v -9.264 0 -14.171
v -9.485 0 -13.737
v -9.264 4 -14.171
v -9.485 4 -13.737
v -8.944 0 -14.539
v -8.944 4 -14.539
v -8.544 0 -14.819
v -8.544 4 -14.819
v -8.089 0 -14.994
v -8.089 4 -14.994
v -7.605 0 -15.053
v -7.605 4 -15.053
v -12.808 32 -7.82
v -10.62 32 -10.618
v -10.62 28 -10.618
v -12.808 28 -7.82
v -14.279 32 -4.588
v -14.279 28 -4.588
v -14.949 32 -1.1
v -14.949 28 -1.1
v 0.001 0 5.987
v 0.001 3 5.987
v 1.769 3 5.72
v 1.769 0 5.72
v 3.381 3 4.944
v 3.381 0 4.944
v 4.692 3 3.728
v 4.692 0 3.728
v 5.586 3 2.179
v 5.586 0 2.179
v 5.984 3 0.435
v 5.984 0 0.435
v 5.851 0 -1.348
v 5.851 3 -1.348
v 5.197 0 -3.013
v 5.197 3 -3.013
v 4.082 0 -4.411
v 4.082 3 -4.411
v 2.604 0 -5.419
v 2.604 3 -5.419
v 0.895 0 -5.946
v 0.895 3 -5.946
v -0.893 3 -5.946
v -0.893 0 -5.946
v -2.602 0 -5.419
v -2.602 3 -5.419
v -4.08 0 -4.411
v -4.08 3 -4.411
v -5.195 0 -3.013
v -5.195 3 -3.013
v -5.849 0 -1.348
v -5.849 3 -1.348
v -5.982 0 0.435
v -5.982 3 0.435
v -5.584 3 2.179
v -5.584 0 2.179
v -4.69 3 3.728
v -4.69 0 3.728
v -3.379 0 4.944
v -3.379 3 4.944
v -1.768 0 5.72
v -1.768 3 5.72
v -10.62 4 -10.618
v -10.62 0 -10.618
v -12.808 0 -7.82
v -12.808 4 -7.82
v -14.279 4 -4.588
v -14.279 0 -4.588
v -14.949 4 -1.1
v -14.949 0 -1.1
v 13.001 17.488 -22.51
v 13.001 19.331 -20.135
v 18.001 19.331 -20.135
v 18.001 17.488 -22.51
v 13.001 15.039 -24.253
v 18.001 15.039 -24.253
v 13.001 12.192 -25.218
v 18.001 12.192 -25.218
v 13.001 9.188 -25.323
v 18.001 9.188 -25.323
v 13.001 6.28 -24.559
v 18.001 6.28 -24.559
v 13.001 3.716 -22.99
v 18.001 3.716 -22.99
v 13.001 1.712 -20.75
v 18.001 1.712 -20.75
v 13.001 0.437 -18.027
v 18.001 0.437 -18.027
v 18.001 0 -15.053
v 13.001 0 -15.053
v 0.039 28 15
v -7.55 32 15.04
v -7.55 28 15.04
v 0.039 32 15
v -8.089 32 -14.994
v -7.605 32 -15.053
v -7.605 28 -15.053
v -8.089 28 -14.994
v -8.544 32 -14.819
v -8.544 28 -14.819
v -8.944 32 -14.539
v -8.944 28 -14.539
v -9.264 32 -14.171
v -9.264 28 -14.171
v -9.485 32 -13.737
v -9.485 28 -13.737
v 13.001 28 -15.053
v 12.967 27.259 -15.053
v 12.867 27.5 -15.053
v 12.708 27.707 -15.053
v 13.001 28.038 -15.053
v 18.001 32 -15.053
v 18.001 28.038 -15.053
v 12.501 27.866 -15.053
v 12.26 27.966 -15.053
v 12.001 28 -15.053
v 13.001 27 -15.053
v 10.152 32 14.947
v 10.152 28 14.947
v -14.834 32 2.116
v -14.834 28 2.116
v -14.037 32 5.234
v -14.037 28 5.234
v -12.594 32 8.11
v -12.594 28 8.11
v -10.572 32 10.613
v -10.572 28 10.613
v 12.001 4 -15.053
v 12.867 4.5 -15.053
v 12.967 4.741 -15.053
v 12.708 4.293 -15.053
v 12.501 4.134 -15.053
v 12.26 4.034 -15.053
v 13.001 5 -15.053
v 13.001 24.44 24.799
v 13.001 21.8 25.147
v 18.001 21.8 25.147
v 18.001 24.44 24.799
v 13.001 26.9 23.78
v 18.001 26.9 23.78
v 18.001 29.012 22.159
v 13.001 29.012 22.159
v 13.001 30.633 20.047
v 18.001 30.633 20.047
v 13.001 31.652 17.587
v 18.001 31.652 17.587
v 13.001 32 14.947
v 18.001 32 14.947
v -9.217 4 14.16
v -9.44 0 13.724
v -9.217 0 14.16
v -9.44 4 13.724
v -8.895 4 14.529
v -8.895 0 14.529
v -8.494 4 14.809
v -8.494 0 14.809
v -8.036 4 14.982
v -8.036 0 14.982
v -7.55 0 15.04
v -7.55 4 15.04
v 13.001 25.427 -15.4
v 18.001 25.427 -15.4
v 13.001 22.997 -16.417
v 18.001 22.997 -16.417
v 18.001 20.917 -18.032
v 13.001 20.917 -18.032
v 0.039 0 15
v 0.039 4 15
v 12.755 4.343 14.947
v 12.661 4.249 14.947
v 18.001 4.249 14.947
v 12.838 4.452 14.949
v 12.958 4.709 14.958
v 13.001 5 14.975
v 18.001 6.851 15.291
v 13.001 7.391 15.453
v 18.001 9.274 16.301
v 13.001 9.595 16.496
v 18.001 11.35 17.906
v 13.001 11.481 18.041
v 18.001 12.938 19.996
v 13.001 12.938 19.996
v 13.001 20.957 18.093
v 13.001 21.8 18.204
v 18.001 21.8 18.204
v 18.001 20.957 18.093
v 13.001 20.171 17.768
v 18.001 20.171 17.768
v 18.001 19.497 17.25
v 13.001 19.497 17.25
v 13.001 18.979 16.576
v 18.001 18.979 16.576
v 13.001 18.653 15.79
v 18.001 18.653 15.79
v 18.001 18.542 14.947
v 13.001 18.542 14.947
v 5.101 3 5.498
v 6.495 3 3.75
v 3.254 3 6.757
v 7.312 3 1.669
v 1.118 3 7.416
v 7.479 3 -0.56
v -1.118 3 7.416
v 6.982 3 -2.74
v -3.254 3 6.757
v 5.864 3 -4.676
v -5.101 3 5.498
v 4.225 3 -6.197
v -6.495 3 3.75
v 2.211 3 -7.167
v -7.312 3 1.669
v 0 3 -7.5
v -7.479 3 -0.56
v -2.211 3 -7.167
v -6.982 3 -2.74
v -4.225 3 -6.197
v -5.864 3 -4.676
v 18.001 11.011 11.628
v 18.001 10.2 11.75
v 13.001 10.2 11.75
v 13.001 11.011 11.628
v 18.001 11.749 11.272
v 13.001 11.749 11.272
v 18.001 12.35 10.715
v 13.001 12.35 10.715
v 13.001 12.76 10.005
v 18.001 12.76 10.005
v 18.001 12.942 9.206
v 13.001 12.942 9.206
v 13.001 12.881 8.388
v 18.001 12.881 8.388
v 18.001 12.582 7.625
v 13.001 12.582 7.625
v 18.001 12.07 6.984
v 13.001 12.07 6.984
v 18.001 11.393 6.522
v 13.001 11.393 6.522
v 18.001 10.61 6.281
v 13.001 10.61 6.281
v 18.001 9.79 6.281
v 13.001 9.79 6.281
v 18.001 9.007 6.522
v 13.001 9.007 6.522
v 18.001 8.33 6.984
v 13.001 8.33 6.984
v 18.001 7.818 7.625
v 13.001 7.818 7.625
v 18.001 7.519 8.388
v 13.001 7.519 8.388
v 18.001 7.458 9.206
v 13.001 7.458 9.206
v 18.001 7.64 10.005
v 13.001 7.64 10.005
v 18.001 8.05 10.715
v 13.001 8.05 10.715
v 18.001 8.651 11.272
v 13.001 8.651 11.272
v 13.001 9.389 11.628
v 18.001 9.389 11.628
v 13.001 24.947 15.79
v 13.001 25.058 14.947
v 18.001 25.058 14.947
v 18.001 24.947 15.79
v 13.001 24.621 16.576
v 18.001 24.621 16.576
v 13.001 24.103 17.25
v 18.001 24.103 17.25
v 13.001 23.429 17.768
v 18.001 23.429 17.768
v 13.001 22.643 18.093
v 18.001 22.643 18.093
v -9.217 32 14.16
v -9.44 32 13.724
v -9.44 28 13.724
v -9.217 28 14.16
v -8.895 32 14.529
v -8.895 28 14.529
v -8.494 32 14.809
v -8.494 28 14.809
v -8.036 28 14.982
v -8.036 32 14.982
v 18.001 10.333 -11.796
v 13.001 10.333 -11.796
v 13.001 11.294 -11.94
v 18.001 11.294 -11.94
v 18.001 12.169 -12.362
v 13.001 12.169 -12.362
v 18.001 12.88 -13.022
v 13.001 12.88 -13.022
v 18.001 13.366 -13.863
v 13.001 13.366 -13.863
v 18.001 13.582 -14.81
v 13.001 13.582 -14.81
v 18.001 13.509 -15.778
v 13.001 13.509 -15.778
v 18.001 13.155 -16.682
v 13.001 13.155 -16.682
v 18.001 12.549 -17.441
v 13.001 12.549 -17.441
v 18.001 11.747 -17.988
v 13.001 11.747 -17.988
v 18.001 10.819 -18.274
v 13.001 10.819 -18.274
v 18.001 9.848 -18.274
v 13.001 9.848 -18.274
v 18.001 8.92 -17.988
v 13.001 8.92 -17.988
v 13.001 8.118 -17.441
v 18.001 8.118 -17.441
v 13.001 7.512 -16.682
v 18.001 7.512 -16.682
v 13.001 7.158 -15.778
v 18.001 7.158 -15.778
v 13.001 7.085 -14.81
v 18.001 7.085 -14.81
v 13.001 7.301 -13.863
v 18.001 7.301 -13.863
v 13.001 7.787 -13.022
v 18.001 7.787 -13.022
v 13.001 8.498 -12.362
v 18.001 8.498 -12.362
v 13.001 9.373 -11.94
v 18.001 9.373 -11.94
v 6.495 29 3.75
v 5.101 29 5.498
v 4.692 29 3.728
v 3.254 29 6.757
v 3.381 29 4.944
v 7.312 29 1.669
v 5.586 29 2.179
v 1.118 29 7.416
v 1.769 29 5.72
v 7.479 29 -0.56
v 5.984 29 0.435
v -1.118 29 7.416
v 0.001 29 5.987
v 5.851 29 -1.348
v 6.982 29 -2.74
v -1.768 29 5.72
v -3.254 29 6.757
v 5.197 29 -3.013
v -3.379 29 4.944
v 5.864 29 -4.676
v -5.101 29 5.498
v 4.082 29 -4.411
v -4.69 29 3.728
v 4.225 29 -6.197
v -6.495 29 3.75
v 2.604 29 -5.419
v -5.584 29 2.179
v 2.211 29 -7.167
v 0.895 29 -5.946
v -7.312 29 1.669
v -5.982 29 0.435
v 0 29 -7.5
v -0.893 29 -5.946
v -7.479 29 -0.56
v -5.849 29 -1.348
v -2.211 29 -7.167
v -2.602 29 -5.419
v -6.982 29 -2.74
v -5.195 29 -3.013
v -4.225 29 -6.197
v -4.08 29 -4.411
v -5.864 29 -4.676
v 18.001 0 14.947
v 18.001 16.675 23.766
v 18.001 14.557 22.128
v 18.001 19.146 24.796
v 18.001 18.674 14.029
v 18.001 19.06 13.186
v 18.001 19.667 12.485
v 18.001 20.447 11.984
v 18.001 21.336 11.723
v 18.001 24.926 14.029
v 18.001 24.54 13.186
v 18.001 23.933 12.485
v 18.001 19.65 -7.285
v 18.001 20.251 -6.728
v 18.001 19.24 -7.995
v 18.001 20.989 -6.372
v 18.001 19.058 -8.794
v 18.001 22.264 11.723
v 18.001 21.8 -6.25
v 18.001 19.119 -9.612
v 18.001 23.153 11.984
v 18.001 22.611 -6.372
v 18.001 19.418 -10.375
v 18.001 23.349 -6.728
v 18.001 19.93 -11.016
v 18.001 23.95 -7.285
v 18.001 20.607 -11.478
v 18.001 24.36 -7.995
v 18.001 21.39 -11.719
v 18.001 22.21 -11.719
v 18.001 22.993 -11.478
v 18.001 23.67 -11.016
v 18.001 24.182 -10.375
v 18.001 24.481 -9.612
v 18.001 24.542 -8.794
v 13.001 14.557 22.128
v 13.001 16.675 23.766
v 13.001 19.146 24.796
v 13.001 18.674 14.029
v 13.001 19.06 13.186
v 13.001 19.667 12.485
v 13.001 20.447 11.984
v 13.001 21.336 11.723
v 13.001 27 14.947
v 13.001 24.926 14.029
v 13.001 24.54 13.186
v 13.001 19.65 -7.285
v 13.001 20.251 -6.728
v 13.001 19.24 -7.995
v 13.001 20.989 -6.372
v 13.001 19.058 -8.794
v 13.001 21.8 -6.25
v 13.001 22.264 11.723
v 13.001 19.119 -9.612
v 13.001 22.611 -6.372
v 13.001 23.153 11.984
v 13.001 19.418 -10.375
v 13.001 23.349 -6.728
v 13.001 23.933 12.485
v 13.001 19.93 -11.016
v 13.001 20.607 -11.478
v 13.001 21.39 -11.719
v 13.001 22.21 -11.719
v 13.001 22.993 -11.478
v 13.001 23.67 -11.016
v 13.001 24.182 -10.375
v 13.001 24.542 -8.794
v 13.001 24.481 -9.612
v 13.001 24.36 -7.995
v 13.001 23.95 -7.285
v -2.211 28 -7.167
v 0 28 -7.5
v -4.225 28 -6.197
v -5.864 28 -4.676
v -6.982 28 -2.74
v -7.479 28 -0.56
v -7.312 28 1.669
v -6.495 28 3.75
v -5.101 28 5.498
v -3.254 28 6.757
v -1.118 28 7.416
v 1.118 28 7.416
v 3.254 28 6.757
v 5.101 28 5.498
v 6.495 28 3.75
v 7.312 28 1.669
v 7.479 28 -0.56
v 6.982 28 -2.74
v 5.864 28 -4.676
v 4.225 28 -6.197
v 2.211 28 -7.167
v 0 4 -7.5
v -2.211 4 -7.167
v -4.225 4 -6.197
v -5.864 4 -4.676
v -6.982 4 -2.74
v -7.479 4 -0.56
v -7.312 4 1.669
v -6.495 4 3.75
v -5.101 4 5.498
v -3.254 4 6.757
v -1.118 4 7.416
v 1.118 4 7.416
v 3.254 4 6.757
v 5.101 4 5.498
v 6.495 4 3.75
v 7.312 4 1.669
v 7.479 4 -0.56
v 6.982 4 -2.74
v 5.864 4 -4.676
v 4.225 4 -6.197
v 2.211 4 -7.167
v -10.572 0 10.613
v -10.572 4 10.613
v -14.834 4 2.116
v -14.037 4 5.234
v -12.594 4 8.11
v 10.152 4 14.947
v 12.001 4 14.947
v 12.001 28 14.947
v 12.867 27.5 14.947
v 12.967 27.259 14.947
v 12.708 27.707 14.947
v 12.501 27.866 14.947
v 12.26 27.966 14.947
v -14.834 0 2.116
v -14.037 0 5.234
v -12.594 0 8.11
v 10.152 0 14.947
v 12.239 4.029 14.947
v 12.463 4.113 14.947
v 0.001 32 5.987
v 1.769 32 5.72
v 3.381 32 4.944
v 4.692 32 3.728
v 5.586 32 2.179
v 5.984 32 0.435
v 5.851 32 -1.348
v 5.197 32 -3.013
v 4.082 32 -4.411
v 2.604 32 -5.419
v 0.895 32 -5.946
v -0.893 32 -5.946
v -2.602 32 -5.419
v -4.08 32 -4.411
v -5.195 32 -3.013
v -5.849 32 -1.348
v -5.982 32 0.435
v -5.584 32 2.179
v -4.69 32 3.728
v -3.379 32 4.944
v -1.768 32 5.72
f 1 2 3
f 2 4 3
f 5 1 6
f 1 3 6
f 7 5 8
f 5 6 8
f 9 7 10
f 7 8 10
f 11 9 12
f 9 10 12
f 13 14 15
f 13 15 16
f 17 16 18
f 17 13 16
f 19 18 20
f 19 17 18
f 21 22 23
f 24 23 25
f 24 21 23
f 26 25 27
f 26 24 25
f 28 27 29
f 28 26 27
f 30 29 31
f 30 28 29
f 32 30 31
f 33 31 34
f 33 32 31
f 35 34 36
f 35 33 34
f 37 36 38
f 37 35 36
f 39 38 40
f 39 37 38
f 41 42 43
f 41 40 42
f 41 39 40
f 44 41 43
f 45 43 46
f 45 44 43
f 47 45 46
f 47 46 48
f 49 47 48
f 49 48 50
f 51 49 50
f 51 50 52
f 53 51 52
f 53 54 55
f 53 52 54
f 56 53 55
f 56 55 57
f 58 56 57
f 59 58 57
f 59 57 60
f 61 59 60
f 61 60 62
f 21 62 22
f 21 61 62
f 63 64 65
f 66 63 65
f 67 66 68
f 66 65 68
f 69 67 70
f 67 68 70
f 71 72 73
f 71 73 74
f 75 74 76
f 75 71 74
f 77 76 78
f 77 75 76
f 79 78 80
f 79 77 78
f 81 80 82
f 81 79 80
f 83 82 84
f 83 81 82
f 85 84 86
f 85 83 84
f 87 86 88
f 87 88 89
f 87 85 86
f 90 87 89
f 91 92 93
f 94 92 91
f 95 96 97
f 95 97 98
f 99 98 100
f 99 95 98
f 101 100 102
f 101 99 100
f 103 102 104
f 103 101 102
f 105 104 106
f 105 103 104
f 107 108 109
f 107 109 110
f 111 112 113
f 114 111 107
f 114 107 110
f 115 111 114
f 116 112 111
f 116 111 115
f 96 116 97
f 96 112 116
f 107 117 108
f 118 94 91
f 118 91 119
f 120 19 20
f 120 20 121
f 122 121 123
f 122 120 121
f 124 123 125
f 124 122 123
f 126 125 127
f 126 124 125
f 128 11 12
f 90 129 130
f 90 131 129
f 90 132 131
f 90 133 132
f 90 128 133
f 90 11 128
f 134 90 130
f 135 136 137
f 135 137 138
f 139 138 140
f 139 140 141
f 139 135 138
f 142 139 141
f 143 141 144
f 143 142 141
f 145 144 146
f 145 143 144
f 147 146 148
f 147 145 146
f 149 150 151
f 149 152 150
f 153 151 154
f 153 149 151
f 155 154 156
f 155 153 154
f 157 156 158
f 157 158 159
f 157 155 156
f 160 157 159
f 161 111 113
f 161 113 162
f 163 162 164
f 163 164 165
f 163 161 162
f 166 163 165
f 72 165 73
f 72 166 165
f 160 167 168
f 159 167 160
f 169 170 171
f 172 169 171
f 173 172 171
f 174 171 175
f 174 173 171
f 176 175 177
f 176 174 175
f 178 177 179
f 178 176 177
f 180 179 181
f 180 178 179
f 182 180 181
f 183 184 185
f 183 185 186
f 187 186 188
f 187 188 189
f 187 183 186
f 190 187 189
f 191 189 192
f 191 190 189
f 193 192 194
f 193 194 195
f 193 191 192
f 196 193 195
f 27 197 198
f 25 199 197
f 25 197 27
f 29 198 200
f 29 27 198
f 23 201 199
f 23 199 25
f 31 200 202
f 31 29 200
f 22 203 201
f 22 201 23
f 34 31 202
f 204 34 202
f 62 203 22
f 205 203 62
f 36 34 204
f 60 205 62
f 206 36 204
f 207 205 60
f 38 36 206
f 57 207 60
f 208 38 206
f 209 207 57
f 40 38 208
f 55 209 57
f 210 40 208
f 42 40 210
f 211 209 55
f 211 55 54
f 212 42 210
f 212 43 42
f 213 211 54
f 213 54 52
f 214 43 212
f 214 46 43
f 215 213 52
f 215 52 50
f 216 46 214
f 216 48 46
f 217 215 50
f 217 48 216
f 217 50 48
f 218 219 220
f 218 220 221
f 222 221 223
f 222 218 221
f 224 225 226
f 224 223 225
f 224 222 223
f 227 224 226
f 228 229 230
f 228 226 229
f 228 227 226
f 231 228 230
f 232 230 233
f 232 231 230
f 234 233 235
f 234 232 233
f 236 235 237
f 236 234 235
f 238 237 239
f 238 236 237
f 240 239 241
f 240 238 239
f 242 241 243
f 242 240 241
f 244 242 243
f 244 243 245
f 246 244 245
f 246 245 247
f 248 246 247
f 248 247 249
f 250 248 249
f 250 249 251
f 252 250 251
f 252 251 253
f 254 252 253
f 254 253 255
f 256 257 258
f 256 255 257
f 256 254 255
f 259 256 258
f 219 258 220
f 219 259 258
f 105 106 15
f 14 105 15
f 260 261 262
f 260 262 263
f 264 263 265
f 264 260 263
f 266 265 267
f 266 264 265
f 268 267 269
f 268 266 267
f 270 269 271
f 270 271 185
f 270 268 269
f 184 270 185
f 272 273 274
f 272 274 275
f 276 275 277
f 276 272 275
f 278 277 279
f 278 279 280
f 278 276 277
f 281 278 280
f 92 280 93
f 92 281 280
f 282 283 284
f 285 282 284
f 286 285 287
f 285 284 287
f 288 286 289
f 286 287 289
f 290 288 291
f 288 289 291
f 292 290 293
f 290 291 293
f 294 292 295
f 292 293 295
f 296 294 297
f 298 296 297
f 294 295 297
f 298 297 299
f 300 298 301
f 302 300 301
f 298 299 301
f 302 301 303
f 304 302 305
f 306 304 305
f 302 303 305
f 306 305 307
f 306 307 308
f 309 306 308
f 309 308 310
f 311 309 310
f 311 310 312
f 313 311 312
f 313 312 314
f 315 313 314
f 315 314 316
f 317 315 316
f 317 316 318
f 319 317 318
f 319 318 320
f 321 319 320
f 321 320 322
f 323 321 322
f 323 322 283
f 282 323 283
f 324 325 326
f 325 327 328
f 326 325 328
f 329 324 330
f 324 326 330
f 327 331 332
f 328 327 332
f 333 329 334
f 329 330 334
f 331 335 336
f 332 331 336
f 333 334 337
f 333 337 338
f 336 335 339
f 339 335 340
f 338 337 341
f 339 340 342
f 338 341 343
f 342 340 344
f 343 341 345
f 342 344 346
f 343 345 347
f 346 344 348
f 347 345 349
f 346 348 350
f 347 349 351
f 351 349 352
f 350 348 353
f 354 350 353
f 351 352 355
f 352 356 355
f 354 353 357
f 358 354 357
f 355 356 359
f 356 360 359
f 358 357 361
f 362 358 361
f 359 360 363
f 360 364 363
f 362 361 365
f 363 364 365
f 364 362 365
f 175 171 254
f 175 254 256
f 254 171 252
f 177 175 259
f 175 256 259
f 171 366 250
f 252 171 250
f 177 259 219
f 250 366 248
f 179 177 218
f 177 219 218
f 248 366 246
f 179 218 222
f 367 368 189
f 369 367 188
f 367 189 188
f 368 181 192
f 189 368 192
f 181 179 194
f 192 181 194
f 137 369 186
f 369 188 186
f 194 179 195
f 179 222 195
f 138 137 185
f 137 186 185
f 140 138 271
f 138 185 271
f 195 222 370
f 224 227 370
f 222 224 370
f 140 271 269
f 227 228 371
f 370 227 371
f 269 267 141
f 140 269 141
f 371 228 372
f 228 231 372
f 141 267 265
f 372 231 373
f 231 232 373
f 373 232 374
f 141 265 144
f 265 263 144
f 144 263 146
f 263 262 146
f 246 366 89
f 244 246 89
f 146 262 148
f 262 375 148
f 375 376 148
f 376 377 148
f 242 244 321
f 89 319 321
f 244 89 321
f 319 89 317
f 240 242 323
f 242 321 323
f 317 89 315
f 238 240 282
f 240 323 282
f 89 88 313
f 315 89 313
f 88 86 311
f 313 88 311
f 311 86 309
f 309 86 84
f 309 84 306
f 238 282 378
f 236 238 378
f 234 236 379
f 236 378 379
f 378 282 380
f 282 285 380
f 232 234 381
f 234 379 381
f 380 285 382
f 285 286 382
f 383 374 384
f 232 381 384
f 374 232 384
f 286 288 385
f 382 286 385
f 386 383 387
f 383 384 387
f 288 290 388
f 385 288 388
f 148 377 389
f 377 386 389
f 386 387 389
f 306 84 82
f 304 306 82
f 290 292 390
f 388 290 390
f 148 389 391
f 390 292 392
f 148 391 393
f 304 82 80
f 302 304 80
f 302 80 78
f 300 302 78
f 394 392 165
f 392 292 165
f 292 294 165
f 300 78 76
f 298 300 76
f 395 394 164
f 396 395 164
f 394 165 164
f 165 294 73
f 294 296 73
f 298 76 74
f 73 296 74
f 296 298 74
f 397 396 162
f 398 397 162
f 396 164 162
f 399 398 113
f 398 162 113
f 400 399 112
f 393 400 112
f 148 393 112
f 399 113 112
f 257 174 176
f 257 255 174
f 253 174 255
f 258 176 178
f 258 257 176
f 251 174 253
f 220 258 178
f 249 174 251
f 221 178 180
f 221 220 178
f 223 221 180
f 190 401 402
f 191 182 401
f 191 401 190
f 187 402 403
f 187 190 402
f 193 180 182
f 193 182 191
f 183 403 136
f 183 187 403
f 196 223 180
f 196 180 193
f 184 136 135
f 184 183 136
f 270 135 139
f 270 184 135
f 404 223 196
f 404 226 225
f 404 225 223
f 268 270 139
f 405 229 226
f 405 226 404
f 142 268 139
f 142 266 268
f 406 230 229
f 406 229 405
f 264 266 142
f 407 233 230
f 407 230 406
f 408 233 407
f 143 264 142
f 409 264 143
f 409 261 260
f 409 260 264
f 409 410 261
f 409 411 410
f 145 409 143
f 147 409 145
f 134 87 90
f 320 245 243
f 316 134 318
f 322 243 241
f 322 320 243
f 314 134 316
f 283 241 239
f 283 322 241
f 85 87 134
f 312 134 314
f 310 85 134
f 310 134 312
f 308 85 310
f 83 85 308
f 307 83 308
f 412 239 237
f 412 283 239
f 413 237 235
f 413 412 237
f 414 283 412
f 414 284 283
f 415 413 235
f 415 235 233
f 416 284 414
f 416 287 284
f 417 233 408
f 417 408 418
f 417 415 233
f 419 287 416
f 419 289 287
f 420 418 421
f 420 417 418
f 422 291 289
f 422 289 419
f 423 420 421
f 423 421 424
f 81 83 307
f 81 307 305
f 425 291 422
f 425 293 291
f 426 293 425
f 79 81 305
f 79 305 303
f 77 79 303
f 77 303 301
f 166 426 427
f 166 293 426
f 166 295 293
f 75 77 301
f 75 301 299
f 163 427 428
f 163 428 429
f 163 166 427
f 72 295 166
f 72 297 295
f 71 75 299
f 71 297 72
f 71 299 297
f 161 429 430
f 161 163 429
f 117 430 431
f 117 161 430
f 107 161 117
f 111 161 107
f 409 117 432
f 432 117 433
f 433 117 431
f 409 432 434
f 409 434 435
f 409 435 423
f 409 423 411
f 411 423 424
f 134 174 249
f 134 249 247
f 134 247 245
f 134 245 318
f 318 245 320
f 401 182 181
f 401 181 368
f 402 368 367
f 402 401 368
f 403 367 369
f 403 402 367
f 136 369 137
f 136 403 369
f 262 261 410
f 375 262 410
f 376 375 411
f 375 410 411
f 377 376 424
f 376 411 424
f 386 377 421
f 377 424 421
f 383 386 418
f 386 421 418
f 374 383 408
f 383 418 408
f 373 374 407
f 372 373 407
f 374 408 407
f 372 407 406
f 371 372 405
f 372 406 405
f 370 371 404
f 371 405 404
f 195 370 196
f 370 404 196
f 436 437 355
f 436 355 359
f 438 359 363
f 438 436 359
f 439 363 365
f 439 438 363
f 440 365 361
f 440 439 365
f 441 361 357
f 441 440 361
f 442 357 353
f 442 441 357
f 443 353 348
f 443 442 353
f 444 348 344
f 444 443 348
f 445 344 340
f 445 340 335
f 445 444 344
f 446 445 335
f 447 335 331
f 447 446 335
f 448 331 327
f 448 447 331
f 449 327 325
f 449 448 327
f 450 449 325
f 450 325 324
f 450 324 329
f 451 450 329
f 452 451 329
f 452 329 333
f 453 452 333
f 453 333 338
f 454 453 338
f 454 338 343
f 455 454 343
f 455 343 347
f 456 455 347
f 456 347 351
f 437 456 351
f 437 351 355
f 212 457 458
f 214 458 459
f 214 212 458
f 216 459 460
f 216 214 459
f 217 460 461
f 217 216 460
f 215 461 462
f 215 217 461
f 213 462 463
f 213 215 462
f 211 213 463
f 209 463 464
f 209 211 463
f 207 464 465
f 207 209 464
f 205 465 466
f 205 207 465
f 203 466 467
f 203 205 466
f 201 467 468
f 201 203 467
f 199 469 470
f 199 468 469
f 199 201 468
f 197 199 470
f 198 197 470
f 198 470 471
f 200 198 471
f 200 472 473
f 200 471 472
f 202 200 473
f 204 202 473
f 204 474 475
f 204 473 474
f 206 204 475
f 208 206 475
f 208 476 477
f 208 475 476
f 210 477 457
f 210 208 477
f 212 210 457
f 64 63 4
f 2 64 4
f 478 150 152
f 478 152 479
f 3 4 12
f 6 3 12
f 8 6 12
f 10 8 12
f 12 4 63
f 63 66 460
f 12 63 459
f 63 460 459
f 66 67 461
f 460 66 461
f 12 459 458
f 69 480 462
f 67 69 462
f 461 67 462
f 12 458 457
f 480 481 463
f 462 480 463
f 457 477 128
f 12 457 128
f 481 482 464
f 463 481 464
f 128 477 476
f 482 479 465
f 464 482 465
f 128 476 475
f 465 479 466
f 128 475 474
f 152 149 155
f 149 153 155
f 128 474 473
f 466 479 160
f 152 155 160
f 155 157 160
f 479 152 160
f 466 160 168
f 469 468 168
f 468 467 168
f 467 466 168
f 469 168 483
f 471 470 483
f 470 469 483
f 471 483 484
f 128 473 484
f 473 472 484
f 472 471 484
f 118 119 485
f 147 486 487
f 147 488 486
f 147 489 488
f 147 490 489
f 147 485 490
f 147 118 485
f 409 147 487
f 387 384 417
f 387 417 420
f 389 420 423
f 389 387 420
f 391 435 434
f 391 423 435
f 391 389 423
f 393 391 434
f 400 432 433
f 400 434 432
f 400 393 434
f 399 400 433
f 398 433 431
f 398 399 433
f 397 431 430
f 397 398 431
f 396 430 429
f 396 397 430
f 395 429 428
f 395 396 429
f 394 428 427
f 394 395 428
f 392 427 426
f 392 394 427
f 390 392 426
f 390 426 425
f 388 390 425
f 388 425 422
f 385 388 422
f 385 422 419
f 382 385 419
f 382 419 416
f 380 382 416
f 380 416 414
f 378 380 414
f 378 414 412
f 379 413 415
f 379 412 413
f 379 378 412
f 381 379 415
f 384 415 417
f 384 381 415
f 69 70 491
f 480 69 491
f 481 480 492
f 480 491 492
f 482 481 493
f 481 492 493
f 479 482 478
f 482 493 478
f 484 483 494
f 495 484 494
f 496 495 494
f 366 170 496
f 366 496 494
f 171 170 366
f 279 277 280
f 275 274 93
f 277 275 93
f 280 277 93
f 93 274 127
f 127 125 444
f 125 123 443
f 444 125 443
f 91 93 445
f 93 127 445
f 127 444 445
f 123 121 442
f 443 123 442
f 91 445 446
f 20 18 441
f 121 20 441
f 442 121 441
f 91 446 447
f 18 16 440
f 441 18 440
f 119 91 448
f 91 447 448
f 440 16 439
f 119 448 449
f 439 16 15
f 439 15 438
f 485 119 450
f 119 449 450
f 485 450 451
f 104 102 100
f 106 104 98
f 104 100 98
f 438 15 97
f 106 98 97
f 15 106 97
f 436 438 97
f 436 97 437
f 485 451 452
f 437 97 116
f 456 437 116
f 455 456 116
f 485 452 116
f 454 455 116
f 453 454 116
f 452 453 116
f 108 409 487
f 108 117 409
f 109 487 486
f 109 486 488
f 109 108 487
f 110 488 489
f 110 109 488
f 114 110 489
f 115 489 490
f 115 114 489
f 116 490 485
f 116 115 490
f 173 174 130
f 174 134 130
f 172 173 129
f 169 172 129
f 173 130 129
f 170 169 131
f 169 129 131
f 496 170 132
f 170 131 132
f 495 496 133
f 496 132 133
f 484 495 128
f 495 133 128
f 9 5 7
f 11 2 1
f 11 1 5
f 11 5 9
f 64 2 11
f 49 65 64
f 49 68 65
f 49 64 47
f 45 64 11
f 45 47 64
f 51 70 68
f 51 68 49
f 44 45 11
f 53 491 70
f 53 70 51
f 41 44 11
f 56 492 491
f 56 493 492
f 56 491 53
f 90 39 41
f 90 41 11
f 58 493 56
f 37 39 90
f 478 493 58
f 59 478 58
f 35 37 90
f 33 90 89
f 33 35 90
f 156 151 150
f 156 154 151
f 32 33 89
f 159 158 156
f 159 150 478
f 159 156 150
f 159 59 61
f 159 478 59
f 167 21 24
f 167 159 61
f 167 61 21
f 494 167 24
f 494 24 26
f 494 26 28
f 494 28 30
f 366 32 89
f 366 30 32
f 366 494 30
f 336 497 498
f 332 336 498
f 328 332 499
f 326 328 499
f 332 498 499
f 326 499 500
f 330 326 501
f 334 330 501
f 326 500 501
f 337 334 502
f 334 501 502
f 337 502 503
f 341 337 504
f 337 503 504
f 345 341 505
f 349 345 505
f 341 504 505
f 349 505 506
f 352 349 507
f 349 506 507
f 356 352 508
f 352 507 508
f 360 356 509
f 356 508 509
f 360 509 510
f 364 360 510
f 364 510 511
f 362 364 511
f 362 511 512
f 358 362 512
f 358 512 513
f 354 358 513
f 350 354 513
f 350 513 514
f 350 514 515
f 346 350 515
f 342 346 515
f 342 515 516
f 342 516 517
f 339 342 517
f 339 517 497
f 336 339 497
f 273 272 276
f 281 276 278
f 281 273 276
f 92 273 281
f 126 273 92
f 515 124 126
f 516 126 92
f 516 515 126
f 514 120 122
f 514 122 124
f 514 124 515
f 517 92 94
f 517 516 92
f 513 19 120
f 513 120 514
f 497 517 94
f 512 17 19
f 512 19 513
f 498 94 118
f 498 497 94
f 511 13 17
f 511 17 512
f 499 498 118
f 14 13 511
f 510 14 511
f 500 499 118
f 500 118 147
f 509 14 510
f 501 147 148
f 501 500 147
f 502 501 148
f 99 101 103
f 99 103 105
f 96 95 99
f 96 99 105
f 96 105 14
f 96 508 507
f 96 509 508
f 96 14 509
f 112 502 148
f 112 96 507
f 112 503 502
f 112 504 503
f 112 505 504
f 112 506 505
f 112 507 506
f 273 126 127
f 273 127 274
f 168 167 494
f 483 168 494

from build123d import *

# Parameters (mm, degrees)
SKETCH2_R               = 6
BOSS_EXTRUDE1_DEPTH     = 4
SKETCH3_W               = 5
SKETCH3_H               = 30
BOSS_EXTRUDE3_DEPTH     = 24
BOSS_EXTRUDE5_DEPTH     = 5
SKETCH7_3_R             = 3.25755
CUT_EXTRUDE3_DEPTH      = 5
FILLET3_R               = 10
CUT_EXTRUDE4_DEPTH      = 25
CUT_EXTRUDE4_DEPTH_BACK = 1
SKETCH8_R               = 7.5
CUT_EXTRUDE5_DEPTH      = 50.515905416
CUT_EXTRUDE5_DEPTH_BACK = 50.515905416
SKETCH9_R               = 2.75
FILLET4_R               = 1
BOSS_EXTRUDE6_DEPTH     = 4
FILLET6_R               = 2
BOSS_EXTRUDE7_DEPTH     = 4


with BuildPart() as part:
    # Sketch2 → Boss-Extrude1 (new body)
    with BuildSketch(Plane(origin=(0, 0, 0), x_dir=(1, 0, 0), z_dir=(0, 1, 0))):
        with BuildLine():
            Line((18.000912404, -14.946929254), (18.000912404, 15.053070746))
            Line((18.000912404, 15.053070746), (0.039090451, 15.053070746))
            ThreePointArc((0.039090451, 15.053070746), (-10.199781301, 11.024824414), (-14.94907539, 1.099832277))
            ThreePointArc((-14.94907539, 1.099832277), (-10.959209921, -10.21234771), (0.039090451, -15.000022662))
            Line((0.039090451, -15.000022662), (10.151696986, -14.946929254))
            Line((10.151696986, -14.946929254), (18.000912404, -14.946929254))
        make_face()
        with Locations(Location((0.000957071, 0.012970337, 0), (0, 0, 270))):
            Circle(SKETCH2_R, mode=Mode.SUBTRACT)
    boss_extrude1 = extrude(amount=BOSS_EXTRUDE1_DEPTH)

    # Sketch3 → Boss-Extrude3 (add)
    with BuildSketch(Plane(origin=(0, 4, 0), x_dir=(1, 0, 0), z_dir=(0, 1, 0))):
        with Locations((15.500912404, 0.053070746)):
            Rectangle(SKETCH3_W, SKETCH3_H)
    extrude(amount=BOSS_EXTRUDE3_DEPTH)

    # Mirror1: Boss-Extrude1 across plane
    add(boss_extrude1.mirror(Plane.ZX.offset(16)))

    # Sketch7 → Boss-Extrude5 (add)
    with BuildSketch(Plane.ZY.offset(-13.000912404)):
        with BuildLine():
            Line((-15.053070746, 0), (-15.053070746, 4))
            Line((-15.053070746, 4), (-15.053070746, 7.075913265))
            ThreePointArc((-15.053070746, 7.075913265), (-18.310620746, 10.333463265), (-15.053070746, 13.591013265))
            Line((-15.053070746, 13.591013265), (-15.053070746, 20.666926531))
            ThreePointArc((-15.053070746, 20.666926531), (-25.386534011, 10.333463265), (-15.053070746, 0))
        make_face()
        with BuildLine():
            ThreePointArc((25.146929254, 21.8), (22.159418422, 29.012489168), (14.946929254, 32))
            Line((14.946929254, 32), (14.946929254, 28))
            Line((14.946929254, 28), (14.946929254, 25.05755))
            ThreePointArc((14.946929254, 25.05755), (17.250364949, 24.103435695), (18.204479254, 21.8))
            ThreePointArc((18.204479254, 21.8), (17.250364949, 19.496564305), (14.946929254, 18.54245))
            Line((14.946929254, 18.54245), (14.946929254, 11.6))
            ThreePointArc((14.946929254, 11.6), (22.159418422, 14.587510832), (25.146929254, 21.8))
        make_face()
        with BuildLine():
            Line((14.946929254, 28), (14.946929254, 32))
            ThreePointArc((14.946929254, 32), (4.746929254, 21.8), (14.946929254, 11.6))
            Line((14.946929254, 11.6), (14.946929254, 18.54245))
            ThreePointArc((14.946929254, 18.54245), (11.689379254, 21.8), (14.946929254, 25.05755))
            Line((14.946929254, 25.05755), (14.946929254, 28))
        make_face()
    extrude(amount=-BOSS_EXTRUDE5_DEPTH)

    # Sketch7<3> → Cut-Extrude3 (cut)
    with BuildSketch(Plane.ZY.offset(-13.000912404)):
        with Locations((14.946929254, 21.8)):
            Circle(SKETCH7_3_R)
        with Locations((-15.053070746, 10.333463265)):
            Circle(SKETCH7_3_R)
    extrude(amount=-CUT_EXTRUDE3_DEPTH, mode=Mode.SUBTRACT)

    # Fillet3
    # the kernel refuses this fillet: 10 mm, written as the material it adds along each edge
    with BuildSketch(Plane(origin=(13.000912404, 20.666926531, -15.053070746), x_dir=(0, -0.25425566101904284, -0.9671370424297528), z_dir=(1, 0, 0))) as fillet3_piece_1:
        with BuildLine():
            CenterArc((7.797239676, 9.671370424), FILLET3_R, 194.729484057, 60.541031886)
            Line((-1.874130748, 7.128813814), (0, 0))
            ThreePointArc((0, 0), (2.627341533, 0.339588165), (5.254683066, 0))
        make_face()
    extrude(amount=5)
    with BuildSketch(Plane(origin=(13.000912404, 11.6, 14.946929254), x_dir=(0, -1, 0), z_dir=(1, 0, 0))) as fillet3_piece_2:
        with BuildLine():
            CenterArc((7.351068344, -10), FILLET3_R, 90, 60.326985198)
            ThreePointArc((-1.337579351, -5.04950495), (-0.340063626, -2.611829759), (0, 0))
            Line((0, 0), (7.351068344, 0))
        make_face()
    extrude(amount=5)

    # Sketch8 → Cut-Extrude4 (cut, two sides: drawn at the far end of the back side and taken through both)
    with BuildSketch(Plane(origin=(0, 4, 0), x_dir=(1, 0, 0), z_dir=(0, 1, 0)).offset(-CUT_EXTRUDE4_DEPTH_BACK)):
        with Locations(Location((0, 0, 0), (0, 0, 90))):
            Circle(SKETCH8_R)
    extrude(amount=CUT_EXTRUDE4_DEPTH + CUT_EXTRUDE4_DEPTH_BACK, mode=Mode.SUBTRACT)

    # Sketch9 → Cut-Extrude5 (cut, two sides: drawn at the far end of the back side and taken through both)
    with BuildSketch(Plane.ZY.offset(-13.000912404).offset(-CUT_EXTRUDE5_DEPTH_BACK)):
        with Locations((9, 10.2)):
            Circle(SKETCH9_R)
        with Locations((-9, 21.8)):
            Circle(SKETCH9_R)
    extrude(amount=CUT_EXTRUDE5_DEPTH + CUT_EXTRUDE5_DEPTH_BACK, mode=Mode.SUBTRACT)

    # Fillet4
    fillet4_edges = [part.edges().sort_by_distance(p)[0] for p in [
        (13.000912404, 4, -0.053070746),
        (13.000912404, 28, -0.053070746),
    ]]
    fillet(fillet4_edges, radius=FILLET4_R)

    # Sketch10 → Boss-Extrude6 (add)
    with BuildSketch(Plane.XZ):
        with BuildLine():
            ThreePointArc((0.039090451, -15.053070746), (-5.733491903, -13.900038334), (-10.620178824, -10.617892431))
            Line((-10.620178824, -10.617892431), (-9.005905934, -15.053070746))
            Line((-9.005905934, -15.053070746), (0.039090451, -15.053070746))
        make_face()
        with BuildLine():
            ThreePointArc((-10.571777141, 10.613334735), (-5.701848976, 13.860114152), (0.039090451, 15.000022662))
            Line((0.039090451, 15.000022662), (-8.957960629, 15.047259158))
            Line((-8.957960629, 15.047259158), (-10.571777141, 10.613334735))
        make_face()
    extrude(amount=-BOSS_EXTRUDE6_DEPTH)

    # Fillet6
    fillet6_edges = [part.edges().sort_by_distance(p)[0] for p in [
        (-9.005905934, 2, -15.053070746),
        (-8.957960629, 2, 15.047259158),
    ]]
    fillet(fillet6_edges, radius=FILLET6_R)

    # Sketch11 → Boss-Extrude7 (add)
    with BuildSketch(Plane(origin=(0, 32, 0), x_dir=(1, 0, 0), z_dir=(0, 1, 0))):
        with BuildLine():
            ThreePointArc((0.039090451, -15.000022662), (-5.701848976, -13.860114152), (-10.571777141, -10.613334735))
            Line((-10.571777141, -10.613334735), (-9.439611791, -13.723933469))
            ThreePointArc((-9.439611791, -13.723933469), (-8.703074785, -14.681202997), (-7.549726254, -15.039865618))
            Line((-7.549726254, -15.039865618), (0.039090451, -15.000022662))
        make_face()
        with BuildLine():
            Line((-9.484876099, 13.737111032), (-10.620178824, 10.617892431))
            ThreePointArc((-10.620178824, 10.617892431), (-5.733491903, 13.900038334), (0.039090451, 15.053070746))
            Line((0.039090451, 15.053070746), (-7.605490857, 15.053070746))
            ThreePointArc((-7.605490857, 15.053070746), (-8.75264373, 14.691374834), (-9.484876099, 13.737111032))
        make_face()
    extrude(amount=-BOSS_EXTRUDE7_DEPTH)


solid = part.part
